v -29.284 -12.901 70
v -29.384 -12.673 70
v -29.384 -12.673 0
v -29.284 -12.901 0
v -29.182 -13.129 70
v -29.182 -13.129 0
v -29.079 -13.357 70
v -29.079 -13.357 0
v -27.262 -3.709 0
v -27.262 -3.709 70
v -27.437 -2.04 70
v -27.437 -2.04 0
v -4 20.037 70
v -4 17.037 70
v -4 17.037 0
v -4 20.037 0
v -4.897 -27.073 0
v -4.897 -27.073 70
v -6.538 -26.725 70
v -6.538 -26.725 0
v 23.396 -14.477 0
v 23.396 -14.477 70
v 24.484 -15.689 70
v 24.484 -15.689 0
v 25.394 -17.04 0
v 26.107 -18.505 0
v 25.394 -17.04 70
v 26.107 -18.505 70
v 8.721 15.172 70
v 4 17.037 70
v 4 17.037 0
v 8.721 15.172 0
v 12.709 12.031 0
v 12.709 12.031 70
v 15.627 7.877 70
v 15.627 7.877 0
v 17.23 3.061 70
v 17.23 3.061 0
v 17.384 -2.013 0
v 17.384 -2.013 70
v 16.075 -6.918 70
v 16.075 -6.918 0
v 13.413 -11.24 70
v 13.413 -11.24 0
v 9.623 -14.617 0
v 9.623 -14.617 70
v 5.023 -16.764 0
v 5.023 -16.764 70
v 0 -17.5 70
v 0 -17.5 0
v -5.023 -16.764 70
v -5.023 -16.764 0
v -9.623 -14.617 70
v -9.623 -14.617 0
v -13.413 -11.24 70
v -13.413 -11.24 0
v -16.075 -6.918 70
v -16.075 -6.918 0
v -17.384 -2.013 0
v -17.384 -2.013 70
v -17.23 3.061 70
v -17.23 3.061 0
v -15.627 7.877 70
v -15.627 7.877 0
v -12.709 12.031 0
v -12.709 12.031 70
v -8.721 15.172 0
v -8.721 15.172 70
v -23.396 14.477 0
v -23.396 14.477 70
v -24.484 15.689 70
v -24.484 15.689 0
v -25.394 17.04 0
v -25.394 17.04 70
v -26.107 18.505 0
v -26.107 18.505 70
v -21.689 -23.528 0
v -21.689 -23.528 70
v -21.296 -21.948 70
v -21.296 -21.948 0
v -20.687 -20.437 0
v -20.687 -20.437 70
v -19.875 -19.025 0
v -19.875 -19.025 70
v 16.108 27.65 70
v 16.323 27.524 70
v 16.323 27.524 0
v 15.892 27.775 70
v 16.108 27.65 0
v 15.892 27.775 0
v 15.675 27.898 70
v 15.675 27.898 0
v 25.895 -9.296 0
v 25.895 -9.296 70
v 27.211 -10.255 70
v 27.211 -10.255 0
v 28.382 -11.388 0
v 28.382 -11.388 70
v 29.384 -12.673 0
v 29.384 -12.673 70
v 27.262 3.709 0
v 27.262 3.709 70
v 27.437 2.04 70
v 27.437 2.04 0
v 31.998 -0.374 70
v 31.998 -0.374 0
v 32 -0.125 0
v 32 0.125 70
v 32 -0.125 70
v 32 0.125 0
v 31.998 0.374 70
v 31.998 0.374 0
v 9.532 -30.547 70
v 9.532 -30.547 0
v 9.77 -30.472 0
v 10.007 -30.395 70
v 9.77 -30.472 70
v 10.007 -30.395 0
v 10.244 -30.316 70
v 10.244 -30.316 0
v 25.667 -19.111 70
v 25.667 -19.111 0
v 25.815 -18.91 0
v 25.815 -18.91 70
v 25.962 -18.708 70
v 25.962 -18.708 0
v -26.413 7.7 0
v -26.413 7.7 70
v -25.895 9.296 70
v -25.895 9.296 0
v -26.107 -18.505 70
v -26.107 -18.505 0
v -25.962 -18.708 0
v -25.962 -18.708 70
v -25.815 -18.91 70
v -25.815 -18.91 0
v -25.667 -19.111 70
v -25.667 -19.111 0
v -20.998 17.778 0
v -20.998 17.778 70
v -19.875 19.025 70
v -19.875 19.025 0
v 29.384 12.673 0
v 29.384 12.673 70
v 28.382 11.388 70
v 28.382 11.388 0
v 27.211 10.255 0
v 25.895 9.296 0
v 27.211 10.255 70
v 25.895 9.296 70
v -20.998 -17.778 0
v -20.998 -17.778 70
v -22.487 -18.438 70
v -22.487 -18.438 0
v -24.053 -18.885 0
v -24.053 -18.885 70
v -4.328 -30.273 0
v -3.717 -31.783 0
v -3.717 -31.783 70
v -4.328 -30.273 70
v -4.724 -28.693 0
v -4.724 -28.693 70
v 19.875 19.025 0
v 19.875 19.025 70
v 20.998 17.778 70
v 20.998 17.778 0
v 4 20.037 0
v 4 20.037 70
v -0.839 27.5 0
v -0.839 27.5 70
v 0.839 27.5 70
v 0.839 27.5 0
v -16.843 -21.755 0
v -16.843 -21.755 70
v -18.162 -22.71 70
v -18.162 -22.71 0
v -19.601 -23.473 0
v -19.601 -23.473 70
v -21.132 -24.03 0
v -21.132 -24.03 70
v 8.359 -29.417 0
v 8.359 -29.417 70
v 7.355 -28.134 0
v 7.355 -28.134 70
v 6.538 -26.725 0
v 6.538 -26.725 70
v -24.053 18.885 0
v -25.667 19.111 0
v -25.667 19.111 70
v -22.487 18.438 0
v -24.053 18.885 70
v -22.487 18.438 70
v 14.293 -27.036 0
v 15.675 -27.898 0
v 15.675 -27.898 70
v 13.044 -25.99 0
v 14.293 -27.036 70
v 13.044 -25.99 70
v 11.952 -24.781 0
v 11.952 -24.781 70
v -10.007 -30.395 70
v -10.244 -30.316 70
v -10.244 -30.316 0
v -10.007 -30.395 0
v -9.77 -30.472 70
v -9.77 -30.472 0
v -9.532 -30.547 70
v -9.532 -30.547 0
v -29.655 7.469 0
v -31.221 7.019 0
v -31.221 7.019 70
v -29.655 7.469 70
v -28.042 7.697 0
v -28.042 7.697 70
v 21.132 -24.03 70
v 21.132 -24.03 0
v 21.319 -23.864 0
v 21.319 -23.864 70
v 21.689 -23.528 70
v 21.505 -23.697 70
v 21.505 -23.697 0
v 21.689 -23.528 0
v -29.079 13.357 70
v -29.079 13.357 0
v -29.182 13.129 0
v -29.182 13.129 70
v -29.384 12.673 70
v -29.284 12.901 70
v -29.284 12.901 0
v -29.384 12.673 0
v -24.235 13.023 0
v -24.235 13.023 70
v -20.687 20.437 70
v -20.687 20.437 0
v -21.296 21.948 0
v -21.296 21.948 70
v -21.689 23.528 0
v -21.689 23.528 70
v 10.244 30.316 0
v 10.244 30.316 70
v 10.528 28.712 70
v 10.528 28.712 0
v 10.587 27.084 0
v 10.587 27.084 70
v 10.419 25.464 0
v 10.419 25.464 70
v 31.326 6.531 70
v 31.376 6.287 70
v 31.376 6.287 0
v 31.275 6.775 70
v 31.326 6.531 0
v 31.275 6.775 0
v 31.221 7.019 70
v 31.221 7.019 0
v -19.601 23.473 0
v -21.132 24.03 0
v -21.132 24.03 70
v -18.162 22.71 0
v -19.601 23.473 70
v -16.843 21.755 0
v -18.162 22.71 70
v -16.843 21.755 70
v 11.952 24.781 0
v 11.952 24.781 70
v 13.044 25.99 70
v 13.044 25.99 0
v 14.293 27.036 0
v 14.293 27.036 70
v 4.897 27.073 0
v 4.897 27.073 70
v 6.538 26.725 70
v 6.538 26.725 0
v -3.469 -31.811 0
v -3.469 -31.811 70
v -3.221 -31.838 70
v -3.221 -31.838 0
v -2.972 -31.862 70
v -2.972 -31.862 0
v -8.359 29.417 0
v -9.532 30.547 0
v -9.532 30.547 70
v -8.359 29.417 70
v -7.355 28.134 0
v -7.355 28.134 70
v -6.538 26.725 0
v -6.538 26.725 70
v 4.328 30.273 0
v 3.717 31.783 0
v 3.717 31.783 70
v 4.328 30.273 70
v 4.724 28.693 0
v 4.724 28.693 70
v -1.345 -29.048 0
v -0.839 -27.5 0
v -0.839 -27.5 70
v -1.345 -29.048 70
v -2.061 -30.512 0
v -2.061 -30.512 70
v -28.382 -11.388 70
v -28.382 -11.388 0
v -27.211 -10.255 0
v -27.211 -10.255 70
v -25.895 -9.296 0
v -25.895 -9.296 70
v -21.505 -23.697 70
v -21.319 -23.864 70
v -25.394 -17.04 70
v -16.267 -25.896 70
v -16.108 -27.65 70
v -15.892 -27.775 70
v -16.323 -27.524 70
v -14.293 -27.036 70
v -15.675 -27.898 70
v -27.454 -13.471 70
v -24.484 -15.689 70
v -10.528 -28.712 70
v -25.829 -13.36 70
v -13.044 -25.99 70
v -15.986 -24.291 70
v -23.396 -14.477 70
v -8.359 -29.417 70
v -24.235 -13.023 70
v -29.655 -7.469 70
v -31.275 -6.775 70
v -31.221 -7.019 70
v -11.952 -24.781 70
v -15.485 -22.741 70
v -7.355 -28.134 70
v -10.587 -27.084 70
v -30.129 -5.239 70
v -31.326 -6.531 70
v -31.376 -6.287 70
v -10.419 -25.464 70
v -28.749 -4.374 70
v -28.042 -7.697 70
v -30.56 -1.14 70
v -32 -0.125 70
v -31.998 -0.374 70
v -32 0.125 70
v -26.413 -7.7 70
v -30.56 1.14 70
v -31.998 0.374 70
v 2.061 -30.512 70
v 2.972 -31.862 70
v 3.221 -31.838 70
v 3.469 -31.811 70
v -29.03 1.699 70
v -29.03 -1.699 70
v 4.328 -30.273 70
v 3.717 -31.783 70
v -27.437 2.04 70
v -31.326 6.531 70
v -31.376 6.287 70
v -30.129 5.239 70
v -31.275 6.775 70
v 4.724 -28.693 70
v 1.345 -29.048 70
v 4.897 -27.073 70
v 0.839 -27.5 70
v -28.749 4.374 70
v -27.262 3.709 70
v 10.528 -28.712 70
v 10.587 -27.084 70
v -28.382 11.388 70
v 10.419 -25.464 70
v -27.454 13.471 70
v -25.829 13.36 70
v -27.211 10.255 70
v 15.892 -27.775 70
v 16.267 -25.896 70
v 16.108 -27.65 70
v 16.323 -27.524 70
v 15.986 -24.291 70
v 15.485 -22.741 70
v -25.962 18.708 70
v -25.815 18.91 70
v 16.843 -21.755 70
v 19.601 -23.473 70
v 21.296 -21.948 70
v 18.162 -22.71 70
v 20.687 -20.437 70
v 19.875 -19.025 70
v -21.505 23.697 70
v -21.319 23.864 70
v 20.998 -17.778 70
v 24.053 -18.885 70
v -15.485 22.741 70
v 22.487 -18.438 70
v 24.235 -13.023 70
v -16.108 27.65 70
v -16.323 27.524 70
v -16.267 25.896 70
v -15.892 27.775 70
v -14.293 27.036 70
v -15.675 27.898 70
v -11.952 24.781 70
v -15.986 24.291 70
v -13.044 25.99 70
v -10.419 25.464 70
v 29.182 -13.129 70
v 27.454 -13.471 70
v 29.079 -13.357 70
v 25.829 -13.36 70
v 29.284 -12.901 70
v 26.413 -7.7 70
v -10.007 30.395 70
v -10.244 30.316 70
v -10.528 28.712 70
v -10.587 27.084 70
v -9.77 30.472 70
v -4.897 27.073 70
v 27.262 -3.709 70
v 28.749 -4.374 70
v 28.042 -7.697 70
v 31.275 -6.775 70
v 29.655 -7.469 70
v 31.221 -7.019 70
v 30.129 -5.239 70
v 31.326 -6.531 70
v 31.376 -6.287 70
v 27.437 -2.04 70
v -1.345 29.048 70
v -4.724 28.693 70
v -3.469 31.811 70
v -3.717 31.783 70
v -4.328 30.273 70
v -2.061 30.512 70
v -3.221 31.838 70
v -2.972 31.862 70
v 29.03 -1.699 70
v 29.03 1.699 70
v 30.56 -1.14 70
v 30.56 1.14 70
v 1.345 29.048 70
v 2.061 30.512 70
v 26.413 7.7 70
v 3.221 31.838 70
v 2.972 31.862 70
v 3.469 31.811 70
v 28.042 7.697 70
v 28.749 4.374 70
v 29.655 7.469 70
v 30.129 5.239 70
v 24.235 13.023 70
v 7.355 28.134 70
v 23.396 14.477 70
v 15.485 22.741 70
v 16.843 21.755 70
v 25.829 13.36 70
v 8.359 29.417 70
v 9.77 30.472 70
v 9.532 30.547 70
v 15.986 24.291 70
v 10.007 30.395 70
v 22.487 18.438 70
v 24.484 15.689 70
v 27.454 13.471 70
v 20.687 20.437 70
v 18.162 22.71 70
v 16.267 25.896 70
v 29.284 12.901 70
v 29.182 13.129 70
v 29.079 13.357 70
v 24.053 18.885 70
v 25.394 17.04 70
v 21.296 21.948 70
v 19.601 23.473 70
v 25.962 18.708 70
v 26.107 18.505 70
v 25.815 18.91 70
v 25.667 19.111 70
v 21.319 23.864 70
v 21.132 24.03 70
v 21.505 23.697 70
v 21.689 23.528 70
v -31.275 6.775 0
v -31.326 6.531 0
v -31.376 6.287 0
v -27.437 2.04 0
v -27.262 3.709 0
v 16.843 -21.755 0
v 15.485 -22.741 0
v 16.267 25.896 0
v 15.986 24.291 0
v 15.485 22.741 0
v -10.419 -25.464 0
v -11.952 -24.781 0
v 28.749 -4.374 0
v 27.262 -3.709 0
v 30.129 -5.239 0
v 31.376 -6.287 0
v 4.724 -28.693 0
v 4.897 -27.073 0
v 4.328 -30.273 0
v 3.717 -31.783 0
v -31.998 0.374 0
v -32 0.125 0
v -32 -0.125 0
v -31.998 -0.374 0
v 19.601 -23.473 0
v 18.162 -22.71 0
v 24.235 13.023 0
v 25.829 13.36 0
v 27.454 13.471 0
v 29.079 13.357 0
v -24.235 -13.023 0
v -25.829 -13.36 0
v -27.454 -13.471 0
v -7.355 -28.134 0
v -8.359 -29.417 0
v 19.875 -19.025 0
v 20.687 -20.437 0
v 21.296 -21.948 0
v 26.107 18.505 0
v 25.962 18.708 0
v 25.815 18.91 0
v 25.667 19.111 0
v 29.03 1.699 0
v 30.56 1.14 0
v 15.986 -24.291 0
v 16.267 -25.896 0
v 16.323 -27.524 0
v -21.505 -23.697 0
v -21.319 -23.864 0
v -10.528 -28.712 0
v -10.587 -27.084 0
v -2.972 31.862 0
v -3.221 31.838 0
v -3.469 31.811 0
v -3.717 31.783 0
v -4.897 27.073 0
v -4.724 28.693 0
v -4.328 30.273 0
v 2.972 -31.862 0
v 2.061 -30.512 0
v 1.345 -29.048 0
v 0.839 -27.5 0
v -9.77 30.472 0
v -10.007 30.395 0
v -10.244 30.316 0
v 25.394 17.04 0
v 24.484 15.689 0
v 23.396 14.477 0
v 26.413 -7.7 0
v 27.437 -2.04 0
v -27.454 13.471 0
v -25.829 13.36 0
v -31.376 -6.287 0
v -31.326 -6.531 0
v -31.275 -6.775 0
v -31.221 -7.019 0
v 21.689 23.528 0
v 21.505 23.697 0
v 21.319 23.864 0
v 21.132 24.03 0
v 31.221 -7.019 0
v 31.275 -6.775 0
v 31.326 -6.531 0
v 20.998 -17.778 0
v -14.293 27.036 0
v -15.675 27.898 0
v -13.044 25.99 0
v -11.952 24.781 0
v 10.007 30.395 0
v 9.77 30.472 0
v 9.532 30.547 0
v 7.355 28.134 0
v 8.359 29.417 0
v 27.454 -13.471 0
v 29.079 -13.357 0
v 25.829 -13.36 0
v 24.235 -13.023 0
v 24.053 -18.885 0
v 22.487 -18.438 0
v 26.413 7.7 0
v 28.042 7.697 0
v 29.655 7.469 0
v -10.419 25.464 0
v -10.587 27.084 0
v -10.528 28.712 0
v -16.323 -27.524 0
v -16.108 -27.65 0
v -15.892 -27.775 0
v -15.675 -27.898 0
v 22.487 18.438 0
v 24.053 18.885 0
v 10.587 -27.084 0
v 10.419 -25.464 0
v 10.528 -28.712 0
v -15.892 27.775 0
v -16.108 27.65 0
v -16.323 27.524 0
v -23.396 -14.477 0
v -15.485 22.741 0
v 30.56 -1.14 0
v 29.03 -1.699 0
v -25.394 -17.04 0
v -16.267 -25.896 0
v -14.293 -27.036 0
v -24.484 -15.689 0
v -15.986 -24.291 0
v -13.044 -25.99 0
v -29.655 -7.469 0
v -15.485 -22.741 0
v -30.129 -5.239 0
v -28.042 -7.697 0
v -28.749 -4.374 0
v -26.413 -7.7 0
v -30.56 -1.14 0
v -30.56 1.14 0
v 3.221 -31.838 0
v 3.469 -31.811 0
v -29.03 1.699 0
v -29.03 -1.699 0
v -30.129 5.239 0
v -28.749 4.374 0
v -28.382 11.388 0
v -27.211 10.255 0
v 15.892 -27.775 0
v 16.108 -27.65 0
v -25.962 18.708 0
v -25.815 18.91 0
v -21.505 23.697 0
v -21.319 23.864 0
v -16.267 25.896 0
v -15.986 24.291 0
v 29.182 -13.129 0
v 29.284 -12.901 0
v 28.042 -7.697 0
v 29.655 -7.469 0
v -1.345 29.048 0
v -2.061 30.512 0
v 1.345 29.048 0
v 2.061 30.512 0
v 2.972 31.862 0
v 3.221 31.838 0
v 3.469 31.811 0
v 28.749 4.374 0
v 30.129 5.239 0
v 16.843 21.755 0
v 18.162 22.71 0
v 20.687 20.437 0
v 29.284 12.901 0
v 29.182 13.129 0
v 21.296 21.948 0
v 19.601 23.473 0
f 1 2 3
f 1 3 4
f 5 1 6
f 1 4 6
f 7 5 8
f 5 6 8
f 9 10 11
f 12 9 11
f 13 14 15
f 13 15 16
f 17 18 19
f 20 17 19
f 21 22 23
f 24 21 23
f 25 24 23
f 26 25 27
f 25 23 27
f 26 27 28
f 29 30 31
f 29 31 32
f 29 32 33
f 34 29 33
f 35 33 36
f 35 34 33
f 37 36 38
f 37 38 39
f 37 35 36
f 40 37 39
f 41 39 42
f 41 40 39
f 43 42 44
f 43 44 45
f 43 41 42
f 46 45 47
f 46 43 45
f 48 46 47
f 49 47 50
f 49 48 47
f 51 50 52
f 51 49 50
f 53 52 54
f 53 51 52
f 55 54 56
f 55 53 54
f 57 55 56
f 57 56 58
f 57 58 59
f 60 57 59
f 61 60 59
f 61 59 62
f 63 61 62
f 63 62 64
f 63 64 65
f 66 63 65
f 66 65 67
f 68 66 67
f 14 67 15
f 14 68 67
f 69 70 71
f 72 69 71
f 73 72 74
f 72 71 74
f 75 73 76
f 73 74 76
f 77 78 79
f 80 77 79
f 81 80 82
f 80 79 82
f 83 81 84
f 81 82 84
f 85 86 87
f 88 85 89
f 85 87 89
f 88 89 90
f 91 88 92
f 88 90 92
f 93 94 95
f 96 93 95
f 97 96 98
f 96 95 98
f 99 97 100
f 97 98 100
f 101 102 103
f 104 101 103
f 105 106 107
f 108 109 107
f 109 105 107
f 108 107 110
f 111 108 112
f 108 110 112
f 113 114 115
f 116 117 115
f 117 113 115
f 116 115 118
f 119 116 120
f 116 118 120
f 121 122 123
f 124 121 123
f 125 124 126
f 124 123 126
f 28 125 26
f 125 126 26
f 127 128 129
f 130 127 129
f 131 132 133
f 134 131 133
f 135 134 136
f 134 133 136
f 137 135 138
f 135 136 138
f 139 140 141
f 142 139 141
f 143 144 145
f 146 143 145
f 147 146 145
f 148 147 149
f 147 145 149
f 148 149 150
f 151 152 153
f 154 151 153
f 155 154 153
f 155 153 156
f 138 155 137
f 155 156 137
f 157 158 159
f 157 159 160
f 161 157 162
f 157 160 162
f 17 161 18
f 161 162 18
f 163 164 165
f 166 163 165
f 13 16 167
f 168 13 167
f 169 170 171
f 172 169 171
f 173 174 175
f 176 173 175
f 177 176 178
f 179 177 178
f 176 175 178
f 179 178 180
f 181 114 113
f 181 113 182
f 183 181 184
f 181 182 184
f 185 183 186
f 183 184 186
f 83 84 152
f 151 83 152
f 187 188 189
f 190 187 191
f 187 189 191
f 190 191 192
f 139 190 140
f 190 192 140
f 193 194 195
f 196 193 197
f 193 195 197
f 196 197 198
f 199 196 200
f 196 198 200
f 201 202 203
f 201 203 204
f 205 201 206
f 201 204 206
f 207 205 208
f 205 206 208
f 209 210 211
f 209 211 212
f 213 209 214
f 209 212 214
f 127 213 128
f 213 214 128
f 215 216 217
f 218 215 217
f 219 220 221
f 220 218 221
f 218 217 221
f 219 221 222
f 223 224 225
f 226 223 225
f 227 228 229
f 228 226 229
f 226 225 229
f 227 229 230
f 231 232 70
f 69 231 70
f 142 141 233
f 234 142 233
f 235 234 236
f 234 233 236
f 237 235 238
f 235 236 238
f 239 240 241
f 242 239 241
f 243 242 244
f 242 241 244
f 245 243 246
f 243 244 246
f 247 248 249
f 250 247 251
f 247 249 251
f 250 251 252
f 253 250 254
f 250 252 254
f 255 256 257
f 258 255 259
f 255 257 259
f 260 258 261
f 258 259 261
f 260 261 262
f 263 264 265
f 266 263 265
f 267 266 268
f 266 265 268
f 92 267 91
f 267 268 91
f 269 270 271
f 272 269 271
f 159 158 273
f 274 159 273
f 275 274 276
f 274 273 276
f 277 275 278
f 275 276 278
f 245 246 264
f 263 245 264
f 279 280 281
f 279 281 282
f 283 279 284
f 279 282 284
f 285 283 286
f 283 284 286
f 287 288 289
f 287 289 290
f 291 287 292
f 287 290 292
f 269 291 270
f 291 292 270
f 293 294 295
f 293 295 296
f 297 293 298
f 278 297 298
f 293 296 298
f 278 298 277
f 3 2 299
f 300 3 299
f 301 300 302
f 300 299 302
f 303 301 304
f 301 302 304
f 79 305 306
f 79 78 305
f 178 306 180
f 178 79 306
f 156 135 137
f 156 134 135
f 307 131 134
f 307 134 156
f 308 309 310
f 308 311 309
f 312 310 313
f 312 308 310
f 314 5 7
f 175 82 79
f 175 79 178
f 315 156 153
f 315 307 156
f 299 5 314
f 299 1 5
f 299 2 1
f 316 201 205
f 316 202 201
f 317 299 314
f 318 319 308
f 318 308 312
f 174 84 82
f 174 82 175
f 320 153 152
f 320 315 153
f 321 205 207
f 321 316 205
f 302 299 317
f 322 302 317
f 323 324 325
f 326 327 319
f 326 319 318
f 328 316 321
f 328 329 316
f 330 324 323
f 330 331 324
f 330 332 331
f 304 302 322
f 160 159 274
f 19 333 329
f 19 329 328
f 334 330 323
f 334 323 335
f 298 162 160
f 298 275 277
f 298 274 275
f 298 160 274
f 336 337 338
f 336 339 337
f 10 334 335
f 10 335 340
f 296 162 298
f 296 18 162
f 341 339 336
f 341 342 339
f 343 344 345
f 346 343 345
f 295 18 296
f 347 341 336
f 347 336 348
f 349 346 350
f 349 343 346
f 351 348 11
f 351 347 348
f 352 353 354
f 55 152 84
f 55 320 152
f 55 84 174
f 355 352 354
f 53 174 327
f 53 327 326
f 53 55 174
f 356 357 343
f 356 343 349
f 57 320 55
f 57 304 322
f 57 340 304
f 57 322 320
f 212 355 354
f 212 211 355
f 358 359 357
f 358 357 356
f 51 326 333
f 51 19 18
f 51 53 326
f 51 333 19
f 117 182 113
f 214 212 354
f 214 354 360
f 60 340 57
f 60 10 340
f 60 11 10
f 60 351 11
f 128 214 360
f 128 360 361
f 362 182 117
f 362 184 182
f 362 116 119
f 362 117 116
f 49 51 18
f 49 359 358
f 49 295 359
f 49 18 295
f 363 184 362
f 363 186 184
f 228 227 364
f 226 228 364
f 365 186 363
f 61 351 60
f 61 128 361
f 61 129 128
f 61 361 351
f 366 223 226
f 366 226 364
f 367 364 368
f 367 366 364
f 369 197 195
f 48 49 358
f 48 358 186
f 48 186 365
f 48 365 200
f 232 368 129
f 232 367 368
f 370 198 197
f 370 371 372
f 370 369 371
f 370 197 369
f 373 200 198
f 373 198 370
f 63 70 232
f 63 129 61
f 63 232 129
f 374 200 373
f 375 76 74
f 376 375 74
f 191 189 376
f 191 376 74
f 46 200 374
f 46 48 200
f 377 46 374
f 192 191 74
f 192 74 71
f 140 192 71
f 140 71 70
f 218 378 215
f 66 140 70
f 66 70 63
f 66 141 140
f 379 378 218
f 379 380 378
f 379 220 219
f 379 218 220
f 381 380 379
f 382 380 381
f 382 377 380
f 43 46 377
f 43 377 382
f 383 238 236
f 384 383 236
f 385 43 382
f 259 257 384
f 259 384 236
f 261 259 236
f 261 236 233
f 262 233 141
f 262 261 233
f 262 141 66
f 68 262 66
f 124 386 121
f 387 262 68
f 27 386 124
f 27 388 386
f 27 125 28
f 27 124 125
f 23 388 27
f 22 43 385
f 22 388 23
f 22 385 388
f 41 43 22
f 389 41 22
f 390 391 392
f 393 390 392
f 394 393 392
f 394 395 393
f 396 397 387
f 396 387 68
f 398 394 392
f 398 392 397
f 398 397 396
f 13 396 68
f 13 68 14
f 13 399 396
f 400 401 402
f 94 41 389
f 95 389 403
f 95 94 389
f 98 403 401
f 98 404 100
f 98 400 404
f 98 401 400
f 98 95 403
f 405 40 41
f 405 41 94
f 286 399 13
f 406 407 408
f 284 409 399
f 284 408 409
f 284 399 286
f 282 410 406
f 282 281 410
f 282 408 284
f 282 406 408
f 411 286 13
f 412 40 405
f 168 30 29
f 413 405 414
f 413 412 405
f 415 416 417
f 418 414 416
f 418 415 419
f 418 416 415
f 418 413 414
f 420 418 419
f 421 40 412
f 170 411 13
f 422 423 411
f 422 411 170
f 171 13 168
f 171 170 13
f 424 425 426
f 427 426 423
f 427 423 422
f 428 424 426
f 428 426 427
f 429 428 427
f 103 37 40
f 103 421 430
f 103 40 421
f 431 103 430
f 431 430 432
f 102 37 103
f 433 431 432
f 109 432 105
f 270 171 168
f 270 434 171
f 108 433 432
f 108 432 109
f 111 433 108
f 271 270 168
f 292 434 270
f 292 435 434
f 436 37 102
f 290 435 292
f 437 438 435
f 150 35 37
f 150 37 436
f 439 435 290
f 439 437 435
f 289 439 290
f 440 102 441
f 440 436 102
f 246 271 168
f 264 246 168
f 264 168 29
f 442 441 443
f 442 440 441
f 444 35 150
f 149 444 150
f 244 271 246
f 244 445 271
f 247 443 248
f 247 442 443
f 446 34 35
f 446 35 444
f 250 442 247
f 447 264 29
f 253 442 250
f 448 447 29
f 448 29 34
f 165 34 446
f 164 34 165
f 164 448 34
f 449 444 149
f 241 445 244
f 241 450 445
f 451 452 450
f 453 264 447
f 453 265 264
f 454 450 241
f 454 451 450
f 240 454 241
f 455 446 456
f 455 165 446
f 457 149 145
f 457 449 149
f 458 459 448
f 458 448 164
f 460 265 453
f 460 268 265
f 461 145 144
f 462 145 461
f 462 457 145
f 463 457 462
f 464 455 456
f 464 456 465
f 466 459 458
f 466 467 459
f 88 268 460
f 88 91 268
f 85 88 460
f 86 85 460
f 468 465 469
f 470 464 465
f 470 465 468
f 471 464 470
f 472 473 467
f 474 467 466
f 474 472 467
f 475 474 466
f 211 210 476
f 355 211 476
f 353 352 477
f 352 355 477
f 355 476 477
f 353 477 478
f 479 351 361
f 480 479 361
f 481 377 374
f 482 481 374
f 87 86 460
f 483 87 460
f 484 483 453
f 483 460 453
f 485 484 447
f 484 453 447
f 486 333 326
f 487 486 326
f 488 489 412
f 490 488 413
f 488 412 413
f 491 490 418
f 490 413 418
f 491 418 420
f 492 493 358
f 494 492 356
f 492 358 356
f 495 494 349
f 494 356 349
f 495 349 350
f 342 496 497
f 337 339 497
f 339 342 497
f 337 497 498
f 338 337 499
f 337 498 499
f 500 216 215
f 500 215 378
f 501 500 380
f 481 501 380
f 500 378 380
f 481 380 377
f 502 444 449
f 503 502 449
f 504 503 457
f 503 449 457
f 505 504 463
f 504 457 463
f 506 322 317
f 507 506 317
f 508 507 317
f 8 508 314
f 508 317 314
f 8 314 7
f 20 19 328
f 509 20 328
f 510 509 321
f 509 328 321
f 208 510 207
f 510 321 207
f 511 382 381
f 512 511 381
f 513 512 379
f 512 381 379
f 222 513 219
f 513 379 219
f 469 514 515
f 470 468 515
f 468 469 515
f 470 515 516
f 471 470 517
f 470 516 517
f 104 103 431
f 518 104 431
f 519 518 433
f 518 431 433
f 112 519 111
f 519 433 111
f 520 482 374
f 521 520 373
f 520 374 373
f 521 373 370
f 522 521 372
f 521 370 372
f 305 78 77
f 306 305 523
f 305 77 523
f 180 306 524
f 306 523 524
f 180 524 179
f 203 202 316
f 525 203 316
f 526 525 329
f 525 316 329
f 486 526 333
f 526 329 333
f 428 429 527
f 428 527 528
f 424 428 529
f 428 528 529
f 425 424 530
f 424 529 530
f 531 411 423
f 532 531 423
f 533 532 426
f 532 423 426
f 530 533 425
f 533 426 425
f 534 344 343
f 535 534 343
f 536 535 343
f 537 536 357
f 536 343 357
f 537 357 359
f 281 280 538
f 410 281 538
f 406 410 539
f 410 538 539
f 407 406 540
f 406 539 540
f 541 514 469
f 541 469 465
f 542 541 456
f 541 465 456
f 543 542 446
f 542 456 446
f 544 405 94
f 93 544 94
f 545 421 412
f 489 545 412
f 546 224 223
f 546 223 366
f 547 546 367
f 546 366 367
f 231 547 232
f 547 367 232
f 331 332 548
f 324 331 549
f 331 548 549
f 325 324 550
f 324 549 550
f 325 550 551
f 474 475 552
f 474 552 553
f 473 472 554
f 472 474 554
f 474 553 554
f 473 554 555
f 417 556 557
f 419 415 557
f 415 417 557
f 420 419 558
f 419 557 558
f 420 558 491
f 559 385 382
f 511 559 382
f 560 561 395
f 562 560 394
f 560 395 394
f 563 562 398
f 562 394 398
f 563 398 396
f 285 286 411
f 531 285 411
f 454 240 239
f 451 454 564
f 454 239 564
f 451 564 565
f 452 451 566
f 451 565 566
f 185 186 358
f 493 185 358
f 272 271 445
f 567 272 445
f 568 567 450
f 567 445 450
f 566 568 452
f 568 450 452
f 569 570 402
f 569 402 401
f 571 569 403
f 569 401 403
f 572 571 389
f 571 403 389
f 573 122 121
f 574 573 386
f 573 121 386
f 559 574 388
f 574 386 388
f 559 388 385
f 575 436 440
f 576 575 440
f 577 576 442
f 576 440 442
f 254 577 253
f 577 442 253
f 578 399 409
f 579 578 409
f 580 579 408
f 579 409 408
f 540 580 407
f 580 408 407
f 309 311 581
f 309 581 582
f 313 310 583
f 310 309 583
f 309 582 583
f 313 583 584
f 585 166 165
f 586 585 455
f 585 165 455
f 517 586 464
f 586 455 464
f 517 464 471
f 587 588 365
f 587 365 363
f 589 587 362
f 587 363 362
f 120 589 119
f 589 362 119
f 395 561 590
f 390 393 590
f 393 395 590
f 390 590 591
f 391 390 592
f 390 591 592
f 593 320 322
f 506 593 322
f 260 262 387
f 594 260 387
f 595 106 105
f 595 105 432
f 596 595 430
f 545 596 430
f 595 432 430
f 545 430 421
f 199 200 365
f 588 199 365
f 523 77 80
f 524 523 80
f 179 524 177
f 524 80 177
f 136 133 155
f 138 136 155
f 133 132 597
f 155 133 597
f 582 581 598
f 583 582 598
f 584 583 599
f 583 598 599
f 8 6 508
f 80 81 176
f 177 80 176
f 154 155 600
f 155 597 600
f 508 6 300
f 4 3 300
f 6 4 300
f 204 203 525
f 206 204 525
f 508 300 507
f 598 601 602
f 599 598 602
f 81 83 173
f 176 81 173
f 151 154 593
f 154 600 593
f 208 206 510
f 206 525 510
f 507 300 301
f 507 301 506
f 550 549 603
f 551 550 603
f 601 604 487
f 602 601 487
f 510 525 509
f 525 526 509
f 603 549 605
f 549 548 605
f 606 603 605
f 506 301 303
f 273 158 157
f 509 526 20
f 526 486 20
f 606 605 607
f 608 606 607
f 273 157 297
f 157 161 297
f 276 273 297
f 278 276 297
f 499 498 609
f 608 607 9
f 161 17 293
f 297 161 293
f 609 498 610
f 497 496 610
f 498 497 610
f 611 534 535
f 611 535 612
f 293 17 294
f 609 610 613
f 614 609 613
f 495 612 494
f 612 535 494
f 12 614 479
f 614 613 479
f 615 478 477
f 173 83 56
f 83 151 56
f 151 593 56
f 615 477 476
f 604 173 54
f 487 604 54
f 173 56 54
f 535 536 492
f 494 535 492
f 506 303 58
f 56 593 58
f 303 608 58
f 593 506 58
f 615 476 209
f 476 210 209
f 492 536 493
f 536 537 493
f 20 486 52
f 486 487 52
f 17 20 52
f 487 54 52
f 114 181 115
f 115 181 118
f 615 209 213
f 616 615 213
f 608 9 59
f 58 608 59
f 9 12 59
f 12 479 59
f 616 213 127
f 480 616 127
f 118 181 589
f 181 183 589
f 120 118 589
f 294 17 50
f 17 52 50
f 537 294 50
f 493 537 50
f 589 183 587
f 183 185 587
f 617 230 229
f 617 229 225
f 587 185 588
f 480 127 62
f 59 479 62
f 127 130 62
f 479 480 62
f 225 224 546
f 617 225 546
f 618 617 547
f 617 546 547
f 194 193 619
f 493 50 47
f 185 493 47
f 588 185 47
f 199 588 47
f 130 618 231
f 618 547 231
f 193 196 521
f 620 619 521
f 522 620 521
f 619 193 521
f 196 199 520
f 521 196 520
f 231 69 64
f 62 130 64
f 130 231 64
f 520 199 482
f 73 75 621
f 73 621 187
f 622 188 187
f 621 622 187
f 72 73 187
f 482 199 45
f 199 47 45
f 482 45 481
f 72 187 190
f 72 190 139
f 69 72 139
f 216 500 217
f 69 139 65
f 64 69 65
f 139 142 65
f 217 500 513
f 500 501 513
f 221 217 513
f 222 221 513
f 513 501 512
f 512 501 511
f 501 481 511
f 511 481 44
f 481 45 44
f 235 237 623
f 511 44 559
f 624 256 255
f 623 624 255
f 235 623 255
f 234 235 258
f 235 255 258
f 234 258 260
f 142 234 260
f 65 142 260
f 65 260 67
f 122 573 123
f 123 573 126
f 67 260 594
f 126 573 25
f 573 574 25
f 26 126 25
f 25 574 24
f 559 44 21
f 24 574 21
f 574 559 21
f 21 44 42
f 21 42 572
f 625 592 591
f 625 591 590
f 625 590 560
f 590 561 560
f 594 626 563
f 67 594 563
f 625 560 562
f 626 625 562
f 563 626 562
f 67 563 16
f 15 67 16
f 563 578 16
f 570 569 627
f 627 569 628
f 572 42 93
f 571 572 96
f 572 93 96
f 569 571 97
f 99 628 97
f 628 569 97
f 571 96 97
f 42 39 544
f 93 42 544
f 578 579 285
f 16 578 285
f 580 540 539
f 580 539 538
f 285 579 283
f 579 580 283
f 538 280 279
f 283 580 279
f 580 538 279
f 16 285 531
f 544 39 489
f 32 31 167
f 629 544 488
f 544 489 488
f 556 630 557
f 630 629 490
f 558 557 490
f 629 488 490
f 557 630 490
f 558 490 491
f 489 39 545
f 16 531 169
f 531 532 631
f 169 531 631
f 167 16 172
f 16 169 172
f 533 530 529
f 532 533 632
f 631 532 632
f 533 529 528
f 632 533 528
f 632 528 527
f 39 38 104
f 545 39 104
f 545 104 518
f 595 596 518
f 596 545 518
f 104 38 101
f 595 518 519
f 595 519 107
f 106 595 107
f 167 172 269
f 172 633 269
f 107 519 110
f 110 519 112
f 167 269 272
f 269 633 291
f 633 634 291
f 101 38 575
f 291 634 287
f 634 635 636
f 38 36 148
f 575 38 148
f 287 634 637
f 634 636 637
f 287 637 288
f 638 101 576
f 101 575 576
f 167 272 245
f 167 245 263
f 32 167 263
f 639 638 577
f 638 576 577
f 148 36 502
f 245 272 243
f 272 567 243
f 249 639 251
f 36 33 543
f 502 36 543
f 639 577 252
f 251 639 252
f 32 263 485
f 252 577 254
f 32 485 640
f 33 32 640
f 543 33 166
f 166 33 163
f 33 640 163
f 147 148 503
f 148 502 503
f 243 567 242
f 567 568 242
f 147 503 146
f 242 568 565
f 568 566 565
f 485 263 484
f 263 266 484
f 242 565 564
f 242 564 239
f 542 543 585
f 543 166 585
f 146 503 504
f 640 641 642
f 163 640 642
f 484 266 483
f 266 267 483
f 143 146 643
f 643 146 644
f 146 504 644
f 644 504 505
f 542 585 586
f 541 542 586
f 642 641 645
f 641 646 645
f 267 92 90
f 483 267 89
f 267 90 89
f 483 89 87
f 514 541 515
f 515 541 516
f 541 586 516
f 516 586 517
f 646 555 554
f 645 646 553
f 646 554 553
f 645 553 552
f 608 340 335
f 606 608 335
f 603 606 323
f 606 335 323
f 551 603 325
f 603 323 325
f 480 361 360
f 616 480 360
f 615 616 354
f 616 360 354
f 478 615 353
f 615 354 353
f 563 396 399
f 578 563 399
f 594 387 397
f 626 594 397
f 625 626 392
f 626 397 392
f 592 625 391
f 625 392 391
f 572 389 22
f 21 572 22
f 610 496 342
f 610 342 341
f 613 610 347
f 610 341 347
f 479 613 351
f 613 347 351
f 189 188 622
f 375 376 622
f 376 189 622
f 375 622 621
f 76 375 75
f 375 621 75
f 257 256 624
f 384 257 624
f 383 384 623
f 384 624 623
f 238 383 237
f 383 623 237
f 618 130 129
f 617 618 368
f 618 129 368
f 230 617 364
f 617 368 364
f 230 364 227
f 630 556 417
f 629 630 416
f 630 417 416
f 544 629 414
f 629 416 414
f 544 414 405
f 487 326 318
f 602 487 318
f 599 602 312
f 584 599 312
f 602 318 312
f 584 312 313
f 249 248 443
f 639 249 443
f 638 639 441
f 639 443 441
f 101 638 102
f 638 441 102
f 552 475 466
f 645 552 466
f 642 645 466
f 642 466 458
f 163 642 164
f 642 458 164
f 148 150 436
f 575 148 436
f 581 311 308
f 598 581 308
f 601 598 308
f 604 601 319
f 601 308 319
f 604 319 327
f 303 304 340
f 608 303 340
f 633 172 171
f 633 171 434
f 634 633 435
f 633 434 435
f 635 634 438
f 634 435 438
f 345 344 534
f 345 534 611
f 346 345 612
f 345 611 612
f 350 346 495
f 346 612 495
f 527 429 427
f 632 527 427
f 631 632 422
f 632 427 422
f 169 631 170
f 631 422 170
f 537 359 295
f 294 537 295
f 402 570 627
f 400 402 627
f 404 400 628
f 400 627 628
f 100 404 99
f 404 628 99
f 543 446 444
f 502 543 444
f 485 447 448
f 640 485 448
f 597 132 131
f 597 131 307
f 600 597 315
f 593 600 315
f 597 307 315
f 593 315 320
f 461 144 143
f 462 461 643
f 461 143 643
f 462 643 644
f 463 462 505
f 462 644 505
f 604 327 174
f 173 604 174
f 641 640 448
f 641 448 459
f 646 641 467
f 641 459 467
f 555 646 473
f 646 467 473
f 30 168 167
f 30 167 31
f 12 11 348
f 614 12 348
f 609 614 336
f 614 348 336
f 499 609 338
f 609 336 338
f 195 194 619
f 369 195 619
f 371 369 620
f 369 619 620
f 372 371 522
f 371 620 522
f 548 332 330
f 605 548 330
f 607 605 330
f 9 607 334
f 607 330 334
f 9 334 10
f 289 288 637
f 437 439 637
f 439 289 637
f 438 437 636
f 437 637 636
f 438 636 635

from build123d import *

# Parameters (mm, degrees)
SKETCH1_R           = 32
BOSS_EXTRUDE1_DEPTH = 70
CUT_EXTRUDE1_DEPTH  = 70
CIRPATTERN1_COUNT   = 30
CUT_EXTRUDE2_DEPTH  = 70


with BuildPart() as part:
    # Sketch1 → Boss-Extrude1 (new body)
    with BuildSketch(Plane.XY):
        Circle(SKETCH1_R)
    extrude(amount=BOSS_EXTRUDE1_DEPTH)

    # Sketch3 → Cut-Extrude1 (cut)
    with BuildSketch(Plane.XY.offset(70)):
        with BuildLine():
            Line((3.082235405, 32), (-3.082235405, 32))
            ThreePointArc((-3.082235405, 32), (-1.716298742, 29.871791027), (-0.838993939, 27.5))
            Line((-0.838993939, 27.5), (0.838993939, 27.5))
            ThreePointArc((0.838993939, 27.5), (1.716298742, 29.871791027), (3.082235405, 32))
        make_face()
    cut_extrude1 = extrude(amount=-CUT_EXTRUDE1_DEPTH, mode=Mode.SUBTRACT)

    # CirPattern1: Cut-Extrude1 ×30 about axis
    cirpattern1_axis = Axis((0, 0, 0), (0, 0, 1))
    for i in range(1, CIRPATTERN1_COUNT):
        add(cut_extrude1.rotate(cirpattern1_axis, i * 360 / CIRPATTERN1_COUNT), mode=Mode.SUBTRACT)

    # Sketch4 → Cut-Extrude2 (cut)
    with BuildSketch(Plane.XY.offset(70)):
        with BuildLine():
            Line((-4, 17.036725037), (-4, 20.036725037))
            Line((-4, 20.036725037), (4, 20.036725037))
            Line((4, 20.036725037), (4, 17.036725037))
            ThreePointArc((4, 17.036725037), (0, -17.5), (-4, 17.036725037))
        make_face()
    extrude(amount=-CUT_EXTRUDE2_DEPTH, mode=Mode.SUBTRACT)


solid = part.part
